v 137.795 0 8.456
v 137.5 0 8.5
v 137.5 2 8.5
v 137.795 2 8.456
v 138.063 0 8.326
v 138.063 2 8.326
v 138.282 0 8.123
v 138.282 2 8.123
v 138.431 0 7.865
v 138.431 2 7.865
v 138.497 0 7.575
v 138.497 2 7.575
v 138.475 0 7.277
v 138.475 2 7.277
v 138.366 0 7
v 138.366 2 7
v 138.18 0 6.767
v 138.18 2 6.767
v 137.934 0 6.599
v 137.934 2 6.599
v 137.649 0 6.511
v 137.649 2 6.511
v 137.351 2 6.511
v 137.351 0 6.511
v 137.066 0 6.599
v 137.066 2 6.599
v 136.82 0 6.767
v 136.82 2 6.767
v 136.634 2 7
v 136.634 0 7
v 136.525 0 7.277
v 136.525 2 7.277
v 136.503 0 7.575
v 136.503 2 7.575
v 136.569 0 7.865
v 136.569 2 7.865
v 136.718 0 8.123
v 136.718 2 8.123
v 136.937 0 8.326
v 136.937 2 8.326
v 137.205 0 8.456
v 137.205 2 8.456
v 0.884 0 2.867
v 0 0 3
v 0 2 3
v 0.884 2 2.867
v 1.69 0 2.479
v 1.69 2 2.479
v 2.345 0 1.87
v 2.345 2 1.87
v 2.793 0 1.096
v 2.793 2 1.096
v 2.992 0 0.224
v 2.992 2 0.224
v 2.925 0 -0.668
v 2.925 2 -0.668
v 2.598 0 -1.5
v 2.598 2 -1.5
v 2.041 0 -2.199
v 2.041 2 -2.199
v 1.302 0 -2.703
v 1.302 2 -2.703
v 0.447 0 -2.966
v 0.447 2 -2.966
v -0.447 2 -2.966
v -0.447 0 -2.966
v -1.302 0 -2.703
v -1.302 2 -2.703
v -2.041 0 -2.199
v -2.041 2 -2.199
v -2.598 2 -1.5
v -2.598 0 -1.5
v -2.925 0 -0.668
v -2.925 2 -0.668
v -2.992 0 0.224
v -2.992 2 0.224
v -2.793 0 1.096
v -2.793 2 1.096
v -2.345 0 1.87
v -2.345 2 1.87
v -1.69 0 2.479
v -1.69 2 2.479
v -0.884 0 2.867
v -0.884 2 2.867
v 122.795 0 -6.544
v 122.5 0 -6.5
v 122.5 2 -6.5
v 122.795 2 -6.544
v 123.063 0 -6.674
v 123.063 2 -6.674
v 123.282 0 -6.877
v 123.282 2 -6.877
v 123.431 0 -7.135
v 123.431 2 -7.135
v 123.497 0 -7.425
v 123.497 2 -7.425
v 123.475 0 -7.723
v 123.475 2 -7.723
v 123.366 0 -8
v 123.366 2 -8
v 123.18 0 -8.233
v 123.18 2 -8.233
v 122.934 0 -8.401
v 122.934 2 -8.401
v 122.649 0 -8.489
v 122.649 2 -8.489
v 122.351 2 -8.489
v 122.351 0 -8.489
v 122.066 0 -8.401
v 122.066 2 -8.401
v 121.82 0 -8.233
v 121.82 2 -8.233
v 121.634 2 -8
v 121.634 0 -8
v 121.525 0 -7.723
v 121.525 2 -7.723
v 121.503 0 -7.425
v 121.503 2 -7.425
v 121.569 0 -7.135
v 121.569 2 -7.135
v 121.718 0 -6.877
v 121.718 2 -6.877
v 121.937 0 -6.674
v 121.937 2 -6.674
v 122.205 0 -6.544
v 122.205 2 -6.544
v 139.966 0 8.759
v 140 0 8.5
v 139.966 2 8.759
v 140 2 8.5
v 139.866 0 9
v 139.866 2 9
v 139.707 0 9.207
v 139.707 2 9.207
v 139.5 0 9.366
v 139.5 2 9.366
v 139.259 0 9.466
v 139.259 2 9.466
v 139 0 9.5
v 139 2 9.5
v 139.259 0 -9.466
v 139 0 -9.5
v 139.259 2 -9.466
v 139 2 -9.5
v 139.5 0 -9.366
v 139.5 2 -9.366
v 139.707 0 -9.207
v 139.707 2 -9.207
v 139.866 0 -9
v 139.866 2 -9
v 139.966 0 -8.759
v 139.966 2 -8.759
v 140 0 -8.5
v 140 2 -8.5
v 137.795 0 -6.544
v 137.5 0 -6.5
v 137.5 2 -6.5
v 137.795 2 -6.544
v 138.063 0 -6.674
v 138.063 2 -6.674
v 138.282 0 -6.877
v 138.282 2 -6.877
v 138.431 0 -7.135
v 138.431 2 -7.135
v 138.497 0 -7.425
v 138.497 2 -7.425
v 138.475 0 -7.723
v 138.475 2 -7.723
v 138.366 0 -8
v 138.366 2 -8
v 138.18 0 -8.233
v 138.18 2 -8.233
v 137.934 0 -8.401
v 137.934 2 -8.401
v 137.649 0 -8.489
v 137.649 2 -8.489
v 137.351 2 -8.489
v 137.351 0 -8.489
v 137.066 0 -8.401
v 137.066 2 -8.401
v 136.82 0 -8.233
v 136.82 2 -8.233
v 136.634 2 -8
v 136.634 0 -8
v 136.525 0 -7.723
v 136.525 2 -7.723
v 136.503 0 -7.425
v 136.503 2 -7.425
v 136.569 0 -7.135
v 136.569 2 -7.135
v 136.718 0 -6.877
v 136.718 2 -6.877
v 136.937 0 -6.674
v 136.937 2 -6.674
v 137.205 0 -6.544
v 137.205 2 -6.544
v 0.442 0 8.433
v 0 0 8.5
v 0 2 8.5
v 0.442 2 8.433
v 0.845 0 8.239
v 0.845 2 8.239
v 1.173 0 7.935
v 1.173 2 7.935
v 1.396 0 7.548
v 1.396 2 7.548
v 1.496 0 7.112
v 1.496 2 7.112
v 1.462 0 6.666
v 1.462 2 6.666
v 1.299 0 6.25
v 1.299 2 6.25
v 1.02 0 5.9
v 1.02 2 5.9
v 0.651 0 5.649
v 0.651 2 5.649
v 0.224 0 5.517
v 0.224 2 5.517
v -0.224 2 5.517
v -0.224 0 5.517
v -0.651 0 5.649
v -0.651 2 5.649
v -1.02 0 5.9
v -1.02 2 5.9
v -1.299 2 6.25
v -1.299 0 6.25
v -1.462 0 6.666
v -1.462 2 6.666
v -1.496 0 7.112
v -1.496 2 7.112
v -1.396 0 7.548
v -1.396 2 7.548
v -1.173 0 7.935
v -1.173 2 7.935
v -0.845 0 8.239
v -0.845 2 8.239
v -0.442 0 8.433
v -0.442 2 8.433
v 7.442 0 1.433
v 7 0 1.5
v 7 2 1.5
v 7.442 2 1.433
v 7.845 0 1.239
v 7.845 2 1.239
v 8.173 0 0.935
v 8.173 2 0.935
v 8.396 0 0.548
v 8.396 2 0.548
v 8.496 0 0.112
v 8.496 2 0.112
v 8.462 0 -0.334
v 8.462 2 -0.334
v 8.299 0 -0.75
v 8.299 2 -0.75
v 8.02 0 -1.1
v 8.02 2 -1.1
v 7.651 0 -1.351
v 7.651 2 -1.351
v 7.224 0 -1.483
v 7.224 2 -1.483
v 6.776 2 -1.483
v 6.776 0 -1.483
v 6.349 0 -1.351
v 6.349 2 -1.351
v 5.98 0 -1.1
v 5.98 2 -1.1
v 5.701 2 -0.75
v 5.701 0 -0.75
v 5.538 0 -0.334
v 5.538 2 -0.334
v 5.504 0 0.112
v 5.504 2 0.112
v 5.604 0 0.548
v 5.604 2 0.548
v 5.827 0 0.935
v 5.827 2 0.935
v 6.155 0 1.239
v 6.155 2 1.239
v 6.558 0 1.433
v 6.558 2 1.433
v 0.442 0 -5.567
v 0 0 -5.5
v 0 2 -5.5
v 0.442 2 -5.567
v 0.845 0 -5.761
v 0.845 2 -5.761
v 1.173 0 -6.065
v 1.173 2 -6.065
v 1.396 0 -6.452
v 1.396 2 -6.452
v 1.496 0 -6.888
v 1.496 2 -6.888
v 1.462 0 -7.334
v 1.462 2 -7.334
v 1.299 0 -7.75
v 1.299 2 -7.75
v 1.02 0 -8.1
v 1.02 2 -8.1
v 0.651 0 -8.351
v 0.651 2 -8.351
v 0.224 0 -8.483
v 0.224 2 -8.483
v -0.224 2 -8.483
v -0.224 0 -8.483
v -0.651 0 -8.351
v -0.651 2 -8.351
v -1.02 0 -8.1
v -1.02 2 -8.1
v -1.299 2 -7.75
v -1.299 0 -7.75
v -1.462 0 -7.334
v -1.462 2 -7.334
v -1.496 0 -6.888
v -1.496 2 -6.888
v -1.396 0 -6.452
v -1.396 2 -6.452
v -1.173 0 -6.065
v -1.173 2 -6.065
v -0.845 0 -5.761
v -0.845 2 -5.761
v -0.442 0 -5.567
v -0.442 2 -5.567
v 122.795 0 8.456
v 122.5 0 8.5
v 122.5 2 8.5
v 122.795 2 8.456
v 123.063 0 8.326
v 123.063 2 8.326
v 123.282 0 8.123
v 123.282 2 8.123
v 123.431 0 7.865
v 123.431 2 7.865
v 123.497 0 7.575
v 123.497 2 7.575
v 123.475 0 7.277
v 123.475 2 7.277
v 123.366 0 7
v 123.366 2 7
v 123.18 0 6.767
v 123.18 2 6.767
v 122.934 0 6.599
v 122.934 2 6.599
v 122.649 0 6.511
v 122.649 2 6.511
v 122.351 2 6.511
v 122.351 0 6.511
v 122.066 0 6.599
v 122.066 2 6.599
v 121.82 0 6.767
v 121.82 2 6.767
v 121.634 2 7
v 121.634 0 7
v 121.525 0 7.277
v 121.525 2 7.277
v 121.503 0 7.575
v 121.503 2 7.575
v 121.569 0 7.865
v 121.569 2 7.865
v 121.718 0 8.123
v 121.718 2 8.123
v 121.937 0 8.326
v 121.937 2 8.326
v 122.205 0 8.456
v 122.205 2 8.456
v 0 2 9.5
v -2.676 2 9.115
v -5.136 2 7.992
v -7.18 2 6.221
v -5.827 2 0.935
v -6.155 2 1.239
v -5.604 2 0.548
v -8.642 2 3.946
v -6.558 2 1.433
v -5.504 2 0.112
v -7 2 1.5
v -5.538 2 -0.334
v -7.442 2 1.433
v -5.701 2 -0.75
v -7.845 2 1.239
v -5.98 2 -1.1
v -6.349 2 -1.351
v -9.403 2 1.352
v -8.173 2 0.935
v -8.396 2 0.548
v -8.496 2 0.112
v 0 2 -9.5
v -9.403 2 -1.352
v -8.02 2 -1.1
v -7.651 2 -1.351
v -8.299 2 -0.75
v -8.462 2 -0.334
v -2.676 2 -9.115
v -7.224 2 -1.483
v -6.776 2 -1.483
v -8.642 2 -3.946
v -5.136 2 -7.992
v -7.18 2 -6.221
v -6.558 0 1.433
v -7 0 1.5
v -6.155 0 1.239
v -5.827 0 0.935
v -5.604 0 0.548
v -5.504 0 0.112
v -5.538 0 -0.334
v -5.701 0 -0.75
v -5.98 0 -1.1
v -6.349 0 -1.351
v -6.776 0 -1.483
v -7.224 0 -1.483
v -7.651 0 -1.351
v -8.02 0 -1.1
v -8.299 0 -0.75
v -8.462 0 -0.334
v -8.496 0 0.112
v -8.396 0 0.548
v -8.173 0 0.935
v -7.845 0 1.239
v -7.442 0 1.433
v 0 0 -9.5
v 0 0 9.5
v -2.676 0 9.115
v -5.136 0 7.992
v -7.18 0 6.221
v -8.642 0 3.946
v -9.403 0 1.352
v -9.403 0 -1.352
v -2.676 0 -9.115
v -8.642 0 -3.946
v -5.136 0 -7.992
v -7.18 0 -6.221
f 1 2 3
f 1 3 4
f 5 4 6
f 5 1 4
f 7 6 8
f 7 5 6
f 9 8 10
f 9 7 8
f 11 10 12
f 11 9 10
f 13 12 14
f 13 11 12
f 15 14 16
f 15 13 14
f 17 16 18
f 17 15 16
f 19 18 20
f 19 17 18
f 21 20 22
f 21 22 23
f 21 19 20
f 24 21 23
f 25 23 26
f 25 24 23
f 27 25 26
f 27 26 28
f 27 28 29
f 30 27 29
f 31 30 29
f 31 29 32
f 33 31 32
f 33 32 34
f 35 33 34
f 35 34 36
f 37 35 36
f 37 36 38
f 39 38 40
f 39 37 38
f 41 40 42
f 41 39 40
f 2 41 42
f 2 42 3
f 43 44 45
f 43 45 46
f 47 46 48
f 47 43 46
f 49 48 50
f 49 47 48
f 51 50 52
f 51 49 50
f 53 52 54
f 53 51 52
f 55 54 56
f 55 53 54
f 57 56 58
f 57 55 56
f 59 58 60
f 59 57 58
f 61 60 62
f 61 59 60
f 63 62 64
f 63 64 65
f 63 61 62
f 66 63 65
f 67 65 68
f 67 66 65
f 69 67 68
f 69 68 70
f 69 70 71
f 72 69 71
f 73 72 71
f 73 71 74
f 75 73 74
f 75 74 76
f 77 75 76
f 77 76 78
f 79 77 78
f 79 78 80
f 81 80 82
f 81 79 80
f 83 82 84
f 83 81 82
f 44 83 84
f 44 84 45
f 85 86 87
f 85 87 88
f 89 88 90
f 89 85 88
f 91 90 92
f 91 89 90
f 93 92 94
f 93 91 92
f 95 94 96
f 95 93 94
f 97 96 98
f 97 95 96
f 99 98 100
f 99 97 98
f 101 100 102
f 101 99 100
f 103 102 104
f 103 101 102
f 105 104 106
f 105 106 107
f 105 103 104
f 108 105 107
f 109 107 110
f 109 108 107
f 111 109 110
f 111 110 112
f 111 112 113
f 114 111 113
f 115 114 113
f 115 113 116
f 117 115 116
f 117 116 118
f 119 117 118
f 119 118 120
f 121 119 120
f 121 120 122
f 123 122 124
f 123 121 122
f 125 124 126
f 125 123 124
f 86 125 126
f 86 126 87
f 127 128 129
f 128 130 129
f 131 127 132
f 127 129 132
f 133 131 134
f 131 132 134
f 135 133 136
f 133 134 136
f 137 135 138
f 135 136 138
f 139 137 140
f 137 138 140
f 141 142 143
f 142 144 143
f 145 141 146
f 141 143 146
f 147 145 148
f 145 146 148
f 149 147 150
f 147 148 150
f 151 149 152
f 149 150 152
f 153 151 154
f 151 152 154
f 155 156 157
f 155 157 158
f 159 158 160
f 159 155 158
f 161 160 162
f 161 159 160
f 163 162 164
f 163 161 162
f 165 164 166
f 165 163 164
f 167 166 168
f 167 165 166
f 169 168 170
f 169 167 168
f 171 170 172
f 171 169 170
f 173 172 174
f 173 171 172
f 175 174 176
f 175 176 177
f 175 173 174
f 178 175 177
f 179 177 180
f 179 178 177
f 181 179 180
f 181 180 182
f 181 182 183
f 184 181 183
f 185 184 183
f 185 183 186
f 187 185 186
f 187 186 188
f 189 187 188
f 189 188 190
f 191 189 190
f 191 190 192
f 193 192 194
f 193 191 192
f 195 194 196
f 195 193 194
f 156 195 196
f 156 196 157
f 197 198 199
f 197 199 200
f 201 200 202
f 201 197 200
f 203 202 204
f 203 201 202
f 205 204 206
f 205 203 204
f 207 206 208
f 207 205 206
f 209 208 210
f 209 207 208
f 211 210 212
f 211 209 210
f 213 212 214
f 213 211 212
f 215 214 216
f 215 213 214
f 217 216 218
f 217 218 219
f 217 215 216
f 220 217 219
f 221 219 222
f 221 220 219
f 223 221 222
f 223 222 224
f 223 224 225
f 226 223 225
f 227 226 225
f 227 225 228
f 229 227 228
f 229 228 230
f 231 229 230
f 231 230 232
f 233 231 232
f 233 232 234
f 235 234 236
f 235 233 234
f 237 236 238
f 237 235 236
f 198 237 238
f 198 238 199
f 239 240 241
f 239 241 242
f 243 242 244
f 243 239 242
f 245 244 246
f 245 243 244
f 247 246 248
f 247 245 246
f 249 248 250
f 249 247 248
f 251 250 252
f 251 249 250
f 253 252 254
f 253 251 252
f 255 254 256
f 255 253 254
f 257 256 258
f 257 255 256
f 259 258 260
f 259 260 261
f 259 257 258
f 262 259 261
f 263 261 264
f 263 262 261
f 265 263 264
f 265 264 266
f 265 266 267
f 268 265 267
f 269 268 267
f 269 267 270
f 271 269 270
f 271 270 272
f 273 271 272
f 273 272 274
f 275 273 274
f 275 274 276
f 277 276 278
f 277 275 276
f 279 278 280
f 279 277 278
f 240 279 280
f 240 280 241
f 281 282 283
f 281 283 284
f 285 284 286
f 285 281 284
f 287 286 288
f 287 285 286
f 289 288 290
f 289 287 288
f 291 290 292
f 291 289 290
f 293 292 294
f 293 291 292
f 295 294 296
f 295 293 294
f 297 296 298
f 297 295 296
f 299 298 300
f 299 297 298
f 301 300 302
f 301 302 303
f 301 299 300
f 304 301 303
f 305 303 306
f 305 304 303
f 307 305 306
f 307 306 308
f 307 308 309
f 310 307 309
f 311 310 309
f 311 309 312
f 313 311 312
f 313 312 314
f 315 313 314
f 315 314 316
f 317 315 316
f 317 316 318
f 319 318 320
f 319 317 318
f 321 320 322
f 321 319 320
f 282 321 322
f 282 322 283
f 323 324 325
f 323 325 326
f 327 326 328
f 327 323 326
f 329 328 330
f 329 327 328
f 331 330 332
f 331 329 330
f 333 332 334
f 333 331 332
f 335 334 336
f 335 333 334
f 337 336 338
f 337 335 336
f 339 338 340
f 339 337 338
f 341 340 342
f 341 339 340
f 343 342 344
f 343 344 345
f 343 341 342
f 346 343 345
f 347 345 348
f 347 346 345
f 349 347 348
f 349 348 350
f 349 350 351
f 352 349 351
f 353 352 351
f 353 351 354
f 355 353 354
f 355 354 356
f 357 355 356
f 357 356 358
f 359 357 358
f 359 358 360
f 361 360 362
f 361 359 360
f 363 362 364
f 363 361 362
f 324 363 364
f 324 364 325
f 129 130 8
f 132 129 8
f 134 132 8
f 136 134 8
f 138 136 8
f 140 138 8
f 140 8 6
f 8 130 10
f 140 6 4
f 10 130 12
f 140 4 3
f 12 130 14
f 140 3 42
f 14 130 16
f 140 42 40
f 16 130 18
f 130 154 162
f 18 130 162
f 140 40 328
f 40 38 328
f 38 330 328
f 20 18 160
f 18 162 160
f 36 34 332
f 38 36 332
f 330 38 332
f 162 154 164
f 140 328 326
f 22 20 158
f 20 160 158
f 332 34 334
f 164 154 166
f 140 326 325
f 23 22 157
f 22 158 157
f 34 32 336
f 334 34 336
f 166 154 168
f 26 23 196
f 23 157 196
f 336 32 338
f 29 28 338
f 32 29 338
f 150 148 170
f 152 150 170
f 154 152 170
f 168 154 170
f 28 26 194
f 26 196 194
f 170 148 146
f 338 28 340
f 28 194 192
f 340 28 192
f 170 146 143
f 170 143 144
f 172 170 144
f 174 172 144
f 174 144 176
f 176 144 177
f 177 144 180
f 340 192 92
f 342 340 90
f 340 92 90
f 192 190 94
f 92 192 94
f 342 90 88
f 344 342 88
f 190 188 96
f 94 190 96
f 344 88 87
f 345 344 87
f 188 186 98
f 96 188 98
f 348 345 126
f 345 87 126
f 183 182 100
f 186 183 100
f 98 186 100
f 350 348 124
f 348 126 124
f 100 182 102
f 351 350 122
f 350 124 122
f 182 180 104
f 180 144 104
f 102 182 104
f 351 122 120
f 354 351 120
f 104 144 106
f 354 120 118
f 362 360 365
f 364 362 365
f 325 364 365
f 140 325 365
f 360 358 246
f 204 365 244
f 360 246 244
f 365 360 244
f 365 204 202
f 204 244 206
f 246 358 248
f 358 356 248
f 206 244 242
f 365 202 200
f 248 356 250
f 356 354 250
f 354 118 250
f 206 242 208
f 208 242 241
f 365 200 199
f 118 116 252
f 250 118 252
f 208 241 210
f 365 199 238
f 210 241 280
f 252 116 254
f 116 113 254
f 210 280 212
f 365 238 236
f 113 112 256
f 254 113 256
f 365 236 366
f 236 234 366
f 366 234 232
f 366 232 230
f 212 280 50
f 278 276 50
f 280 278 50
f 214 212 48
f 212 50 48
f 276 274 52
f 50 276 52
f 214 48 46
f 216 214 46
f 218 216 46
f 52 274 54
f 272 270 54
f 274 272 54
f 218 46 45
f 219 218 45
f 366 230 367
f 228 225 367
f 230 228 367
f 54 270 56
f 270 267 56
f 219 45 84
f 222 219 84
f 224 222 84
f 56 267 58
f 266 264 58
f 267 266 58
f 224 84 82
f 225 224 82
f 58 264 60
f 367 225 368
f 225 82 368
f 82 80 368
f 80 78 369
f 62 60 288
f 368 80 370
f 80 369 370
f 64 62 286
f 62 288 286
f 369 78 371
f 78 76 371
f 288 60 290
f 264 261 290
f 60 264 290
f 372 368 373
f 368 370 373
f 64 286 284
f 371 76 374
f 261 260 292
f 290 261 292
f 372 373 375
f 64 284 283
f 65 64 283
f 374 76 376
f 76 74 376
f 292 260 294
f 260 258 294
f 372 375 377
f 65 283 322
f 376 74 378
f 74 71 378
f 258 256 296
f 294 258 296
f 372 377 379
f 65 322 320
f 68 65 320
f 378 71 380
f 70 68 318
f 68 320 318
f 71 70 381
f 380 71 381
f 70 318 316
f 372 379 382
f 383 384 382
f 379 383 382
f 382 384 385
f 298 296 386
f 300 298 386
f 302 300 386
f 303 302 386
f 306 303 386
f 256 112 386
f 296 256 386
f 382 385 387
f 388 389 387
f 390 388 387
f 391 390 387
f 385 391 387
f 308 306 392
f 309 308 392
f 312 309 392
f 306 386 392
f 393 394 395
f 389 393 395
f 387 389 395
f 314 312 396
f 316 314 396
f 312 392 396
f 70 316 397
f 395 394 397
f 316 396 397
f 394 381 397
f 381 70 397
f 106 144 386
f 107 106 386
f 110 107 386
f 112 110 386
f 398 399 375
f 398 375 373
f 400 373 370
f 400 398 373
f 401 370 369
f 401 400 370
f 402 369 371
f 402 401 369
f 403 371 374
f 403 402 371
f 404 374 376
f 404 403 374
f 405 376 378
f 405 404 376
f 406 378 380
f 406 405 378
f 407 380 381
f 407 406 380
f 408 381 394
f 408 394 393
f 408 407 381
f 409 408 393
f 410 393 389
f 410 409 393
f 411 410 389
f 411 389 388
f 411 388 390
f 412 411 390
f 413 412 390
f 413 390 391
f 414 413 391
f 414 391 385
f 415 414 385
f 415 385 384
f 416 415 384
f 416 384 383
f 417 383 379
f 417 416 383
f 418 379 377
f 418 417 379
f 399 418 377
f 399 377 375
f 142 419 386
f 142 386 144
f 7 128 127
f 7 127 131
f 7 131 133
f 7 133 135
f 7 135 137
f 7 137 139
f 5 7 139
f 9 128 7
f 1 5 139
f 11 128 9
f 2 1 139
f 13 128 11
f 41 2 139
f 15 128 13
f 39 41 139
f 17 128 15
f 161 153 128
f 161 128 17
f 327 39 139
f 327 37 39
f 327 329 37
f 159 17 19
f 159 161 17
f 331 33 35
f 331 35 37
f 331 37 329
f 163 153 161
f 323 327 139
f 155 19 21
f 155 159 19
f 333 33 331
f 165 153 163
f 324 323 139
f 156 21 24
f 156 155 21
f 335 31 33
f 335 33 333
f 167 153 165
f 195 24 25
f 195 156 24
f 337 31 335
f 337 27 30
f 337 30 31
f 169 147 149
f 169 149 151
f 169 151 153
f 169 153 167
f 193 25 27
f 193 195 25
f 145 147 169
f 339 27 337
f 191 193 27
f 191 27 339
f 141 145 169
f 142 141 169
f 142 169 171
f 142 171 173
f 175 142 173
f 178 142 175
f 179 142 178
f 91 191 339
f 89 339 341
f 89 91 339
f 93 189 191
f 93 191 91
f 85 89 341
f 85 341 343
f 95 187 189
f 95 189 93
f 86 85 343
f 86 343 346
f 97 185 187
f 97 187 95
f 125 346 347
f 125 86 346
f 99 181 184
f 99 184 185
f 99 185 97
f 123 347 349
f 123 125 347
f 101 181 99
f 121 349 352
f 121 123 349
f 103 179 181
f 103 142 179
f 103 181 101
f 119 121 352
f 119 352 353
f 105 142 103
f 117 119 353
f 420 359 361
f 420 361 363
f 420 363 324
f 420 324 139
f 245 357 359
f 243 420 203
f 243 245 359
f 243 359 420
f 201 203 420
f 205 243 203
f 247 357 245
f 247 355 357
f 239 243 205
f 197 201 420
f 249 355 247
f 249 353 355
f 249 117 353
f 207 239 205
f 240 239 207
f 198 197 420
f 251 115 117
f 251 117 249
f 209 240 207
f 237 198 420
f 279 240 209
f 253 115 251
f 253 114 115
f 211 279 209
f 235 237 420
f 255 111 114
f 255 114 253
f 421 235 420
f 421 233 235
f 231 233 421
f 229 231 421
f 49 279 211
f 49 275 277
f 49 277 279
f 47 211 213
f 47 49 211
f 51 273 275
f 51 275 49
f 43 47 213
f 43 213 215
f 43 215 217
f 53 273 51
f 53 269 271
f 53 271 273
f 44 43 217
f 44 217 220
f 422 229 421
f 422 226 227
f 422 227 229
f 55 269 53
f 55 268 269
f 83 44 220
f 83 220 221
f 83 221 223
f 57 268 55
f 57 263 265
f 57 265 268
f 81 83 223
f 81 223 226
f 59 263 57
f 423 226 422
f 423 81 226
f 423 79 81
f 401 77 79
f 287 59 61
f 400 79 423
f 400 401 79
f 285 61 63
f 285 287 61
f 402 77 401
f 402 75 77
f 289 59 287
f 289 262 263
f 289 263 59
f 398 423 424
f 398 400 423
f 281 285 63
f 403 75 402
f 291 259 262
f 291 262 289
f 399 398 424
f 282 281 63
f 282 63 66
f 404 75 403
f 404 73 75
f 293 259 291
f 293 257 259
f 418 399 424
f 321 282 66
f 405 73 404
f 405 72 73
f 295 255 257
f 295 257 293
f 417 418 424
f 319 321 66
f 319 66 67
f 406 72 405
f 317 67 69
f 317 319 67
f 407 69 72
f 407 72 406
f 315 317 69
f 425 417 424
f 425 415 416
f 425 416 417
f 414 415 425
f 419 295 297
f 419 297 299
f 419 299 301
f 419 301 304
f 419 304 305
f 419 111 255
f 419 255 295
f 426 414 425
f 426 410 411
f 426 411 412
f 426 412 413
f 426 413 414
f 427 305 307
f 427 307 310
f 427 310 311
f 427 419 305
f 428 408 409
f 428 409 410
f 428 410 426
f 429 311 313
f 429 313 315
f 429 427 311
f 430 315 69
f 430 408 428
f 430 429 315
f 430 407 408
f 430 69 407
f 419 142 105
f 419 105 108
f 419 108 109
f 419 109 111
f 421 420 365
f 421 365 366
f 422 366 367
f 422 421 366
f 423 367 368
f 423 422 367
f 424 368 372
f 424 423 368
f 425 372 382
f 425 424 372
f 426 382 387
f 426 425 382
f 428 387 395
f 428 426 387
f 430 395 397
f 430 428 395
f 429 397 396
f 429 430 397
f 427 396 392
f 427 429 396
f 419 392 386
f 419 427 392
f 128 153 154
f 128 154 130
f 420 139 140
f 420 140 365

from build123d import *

# Parameters (mm, degrees)
SKETCH_1_R      = 1.5
SKETCH_1_R_2    = 1
SKETCH_1_R_3    = 3
EXTRUDE_1_DEPTH = 2
FILLET_1_R      = 1


with BuildPart() as part:
    # Эскиз1 → Бобышка-Вытянуть1 (new body)
    with BuildSketch(Plane(origin=(0, 0, 0), x_dir=(1, 0, 0), z_dir=(0, 1, 0))):
        with BuildLine():
            Line((0, 9.5), (140, 9.5))
            Line((140, 9.5), (140, -9.5))
            Line((140, -9.5), (0, -9.5))
            ThreePointArc((0, -9.5), (-9.5, 0), (0, 9.5))
        make_face()
        with Locations(Location((0, 7, 0), (0, 0, 270))):
            Circle(SKETCH_1_R, mode=Mode.SUBTRACT)
        with Locations(Location((7, 0, 0), (0, 0, 270))):
            Circle(SKETCH_1_R, mode=Mode.SUBTRACT)
        with Locations(Location((0, -7, 0), (0, 0, 270))):
            Circle(SKETCH_1_R, mode=Mode.SUBTRACT)
        with Locations(Location((-7, 0, 0), (0, 0, 270))):
            Circle(SKETCH_1_R, mode=Mode.SUBTRACT)
        with Locations(Location((122.5, 7.5, 0), (0, 0, 270))):
            Circle(SKETCH_1_R_2, mode=Mode.SUBTRACT)
        with Locations(Location((137.5, 7.5, 0), (0, 0, 270))):
            Circle(SKETCH_1_R_2, mode=Mode.SUBTRACT)
        with Locations(Location((122.5, -7.5, 0), (0, 0, 270))):
            Circle(SKETCH_1_R_2, mode=Mode.SUBTRACT)
        with Locations(Location((137.5, -7.5, 0), (0, 0, 270))):
            Circle(SKETCH_1_R_2, mode=Mode.SUBTRACT)
        with Locations(Location((0, 0, 0), (0, 0, 270))):
            Circle(SKETCH_1_R_3, mode=Mode.SUBTRACT)
    extrude(amount=EXTRUDE_1_DEPTH)

    # Скругление1
    fillet_1_edges = [part.edges().sort_by_distance(p)[0] for p in [
        (140, 1, -9.5),
        (140, 1, 9.5),
    ]]
    fillet(fillet_1_edges, radius=FILLET_1_R)


solid = part.part
